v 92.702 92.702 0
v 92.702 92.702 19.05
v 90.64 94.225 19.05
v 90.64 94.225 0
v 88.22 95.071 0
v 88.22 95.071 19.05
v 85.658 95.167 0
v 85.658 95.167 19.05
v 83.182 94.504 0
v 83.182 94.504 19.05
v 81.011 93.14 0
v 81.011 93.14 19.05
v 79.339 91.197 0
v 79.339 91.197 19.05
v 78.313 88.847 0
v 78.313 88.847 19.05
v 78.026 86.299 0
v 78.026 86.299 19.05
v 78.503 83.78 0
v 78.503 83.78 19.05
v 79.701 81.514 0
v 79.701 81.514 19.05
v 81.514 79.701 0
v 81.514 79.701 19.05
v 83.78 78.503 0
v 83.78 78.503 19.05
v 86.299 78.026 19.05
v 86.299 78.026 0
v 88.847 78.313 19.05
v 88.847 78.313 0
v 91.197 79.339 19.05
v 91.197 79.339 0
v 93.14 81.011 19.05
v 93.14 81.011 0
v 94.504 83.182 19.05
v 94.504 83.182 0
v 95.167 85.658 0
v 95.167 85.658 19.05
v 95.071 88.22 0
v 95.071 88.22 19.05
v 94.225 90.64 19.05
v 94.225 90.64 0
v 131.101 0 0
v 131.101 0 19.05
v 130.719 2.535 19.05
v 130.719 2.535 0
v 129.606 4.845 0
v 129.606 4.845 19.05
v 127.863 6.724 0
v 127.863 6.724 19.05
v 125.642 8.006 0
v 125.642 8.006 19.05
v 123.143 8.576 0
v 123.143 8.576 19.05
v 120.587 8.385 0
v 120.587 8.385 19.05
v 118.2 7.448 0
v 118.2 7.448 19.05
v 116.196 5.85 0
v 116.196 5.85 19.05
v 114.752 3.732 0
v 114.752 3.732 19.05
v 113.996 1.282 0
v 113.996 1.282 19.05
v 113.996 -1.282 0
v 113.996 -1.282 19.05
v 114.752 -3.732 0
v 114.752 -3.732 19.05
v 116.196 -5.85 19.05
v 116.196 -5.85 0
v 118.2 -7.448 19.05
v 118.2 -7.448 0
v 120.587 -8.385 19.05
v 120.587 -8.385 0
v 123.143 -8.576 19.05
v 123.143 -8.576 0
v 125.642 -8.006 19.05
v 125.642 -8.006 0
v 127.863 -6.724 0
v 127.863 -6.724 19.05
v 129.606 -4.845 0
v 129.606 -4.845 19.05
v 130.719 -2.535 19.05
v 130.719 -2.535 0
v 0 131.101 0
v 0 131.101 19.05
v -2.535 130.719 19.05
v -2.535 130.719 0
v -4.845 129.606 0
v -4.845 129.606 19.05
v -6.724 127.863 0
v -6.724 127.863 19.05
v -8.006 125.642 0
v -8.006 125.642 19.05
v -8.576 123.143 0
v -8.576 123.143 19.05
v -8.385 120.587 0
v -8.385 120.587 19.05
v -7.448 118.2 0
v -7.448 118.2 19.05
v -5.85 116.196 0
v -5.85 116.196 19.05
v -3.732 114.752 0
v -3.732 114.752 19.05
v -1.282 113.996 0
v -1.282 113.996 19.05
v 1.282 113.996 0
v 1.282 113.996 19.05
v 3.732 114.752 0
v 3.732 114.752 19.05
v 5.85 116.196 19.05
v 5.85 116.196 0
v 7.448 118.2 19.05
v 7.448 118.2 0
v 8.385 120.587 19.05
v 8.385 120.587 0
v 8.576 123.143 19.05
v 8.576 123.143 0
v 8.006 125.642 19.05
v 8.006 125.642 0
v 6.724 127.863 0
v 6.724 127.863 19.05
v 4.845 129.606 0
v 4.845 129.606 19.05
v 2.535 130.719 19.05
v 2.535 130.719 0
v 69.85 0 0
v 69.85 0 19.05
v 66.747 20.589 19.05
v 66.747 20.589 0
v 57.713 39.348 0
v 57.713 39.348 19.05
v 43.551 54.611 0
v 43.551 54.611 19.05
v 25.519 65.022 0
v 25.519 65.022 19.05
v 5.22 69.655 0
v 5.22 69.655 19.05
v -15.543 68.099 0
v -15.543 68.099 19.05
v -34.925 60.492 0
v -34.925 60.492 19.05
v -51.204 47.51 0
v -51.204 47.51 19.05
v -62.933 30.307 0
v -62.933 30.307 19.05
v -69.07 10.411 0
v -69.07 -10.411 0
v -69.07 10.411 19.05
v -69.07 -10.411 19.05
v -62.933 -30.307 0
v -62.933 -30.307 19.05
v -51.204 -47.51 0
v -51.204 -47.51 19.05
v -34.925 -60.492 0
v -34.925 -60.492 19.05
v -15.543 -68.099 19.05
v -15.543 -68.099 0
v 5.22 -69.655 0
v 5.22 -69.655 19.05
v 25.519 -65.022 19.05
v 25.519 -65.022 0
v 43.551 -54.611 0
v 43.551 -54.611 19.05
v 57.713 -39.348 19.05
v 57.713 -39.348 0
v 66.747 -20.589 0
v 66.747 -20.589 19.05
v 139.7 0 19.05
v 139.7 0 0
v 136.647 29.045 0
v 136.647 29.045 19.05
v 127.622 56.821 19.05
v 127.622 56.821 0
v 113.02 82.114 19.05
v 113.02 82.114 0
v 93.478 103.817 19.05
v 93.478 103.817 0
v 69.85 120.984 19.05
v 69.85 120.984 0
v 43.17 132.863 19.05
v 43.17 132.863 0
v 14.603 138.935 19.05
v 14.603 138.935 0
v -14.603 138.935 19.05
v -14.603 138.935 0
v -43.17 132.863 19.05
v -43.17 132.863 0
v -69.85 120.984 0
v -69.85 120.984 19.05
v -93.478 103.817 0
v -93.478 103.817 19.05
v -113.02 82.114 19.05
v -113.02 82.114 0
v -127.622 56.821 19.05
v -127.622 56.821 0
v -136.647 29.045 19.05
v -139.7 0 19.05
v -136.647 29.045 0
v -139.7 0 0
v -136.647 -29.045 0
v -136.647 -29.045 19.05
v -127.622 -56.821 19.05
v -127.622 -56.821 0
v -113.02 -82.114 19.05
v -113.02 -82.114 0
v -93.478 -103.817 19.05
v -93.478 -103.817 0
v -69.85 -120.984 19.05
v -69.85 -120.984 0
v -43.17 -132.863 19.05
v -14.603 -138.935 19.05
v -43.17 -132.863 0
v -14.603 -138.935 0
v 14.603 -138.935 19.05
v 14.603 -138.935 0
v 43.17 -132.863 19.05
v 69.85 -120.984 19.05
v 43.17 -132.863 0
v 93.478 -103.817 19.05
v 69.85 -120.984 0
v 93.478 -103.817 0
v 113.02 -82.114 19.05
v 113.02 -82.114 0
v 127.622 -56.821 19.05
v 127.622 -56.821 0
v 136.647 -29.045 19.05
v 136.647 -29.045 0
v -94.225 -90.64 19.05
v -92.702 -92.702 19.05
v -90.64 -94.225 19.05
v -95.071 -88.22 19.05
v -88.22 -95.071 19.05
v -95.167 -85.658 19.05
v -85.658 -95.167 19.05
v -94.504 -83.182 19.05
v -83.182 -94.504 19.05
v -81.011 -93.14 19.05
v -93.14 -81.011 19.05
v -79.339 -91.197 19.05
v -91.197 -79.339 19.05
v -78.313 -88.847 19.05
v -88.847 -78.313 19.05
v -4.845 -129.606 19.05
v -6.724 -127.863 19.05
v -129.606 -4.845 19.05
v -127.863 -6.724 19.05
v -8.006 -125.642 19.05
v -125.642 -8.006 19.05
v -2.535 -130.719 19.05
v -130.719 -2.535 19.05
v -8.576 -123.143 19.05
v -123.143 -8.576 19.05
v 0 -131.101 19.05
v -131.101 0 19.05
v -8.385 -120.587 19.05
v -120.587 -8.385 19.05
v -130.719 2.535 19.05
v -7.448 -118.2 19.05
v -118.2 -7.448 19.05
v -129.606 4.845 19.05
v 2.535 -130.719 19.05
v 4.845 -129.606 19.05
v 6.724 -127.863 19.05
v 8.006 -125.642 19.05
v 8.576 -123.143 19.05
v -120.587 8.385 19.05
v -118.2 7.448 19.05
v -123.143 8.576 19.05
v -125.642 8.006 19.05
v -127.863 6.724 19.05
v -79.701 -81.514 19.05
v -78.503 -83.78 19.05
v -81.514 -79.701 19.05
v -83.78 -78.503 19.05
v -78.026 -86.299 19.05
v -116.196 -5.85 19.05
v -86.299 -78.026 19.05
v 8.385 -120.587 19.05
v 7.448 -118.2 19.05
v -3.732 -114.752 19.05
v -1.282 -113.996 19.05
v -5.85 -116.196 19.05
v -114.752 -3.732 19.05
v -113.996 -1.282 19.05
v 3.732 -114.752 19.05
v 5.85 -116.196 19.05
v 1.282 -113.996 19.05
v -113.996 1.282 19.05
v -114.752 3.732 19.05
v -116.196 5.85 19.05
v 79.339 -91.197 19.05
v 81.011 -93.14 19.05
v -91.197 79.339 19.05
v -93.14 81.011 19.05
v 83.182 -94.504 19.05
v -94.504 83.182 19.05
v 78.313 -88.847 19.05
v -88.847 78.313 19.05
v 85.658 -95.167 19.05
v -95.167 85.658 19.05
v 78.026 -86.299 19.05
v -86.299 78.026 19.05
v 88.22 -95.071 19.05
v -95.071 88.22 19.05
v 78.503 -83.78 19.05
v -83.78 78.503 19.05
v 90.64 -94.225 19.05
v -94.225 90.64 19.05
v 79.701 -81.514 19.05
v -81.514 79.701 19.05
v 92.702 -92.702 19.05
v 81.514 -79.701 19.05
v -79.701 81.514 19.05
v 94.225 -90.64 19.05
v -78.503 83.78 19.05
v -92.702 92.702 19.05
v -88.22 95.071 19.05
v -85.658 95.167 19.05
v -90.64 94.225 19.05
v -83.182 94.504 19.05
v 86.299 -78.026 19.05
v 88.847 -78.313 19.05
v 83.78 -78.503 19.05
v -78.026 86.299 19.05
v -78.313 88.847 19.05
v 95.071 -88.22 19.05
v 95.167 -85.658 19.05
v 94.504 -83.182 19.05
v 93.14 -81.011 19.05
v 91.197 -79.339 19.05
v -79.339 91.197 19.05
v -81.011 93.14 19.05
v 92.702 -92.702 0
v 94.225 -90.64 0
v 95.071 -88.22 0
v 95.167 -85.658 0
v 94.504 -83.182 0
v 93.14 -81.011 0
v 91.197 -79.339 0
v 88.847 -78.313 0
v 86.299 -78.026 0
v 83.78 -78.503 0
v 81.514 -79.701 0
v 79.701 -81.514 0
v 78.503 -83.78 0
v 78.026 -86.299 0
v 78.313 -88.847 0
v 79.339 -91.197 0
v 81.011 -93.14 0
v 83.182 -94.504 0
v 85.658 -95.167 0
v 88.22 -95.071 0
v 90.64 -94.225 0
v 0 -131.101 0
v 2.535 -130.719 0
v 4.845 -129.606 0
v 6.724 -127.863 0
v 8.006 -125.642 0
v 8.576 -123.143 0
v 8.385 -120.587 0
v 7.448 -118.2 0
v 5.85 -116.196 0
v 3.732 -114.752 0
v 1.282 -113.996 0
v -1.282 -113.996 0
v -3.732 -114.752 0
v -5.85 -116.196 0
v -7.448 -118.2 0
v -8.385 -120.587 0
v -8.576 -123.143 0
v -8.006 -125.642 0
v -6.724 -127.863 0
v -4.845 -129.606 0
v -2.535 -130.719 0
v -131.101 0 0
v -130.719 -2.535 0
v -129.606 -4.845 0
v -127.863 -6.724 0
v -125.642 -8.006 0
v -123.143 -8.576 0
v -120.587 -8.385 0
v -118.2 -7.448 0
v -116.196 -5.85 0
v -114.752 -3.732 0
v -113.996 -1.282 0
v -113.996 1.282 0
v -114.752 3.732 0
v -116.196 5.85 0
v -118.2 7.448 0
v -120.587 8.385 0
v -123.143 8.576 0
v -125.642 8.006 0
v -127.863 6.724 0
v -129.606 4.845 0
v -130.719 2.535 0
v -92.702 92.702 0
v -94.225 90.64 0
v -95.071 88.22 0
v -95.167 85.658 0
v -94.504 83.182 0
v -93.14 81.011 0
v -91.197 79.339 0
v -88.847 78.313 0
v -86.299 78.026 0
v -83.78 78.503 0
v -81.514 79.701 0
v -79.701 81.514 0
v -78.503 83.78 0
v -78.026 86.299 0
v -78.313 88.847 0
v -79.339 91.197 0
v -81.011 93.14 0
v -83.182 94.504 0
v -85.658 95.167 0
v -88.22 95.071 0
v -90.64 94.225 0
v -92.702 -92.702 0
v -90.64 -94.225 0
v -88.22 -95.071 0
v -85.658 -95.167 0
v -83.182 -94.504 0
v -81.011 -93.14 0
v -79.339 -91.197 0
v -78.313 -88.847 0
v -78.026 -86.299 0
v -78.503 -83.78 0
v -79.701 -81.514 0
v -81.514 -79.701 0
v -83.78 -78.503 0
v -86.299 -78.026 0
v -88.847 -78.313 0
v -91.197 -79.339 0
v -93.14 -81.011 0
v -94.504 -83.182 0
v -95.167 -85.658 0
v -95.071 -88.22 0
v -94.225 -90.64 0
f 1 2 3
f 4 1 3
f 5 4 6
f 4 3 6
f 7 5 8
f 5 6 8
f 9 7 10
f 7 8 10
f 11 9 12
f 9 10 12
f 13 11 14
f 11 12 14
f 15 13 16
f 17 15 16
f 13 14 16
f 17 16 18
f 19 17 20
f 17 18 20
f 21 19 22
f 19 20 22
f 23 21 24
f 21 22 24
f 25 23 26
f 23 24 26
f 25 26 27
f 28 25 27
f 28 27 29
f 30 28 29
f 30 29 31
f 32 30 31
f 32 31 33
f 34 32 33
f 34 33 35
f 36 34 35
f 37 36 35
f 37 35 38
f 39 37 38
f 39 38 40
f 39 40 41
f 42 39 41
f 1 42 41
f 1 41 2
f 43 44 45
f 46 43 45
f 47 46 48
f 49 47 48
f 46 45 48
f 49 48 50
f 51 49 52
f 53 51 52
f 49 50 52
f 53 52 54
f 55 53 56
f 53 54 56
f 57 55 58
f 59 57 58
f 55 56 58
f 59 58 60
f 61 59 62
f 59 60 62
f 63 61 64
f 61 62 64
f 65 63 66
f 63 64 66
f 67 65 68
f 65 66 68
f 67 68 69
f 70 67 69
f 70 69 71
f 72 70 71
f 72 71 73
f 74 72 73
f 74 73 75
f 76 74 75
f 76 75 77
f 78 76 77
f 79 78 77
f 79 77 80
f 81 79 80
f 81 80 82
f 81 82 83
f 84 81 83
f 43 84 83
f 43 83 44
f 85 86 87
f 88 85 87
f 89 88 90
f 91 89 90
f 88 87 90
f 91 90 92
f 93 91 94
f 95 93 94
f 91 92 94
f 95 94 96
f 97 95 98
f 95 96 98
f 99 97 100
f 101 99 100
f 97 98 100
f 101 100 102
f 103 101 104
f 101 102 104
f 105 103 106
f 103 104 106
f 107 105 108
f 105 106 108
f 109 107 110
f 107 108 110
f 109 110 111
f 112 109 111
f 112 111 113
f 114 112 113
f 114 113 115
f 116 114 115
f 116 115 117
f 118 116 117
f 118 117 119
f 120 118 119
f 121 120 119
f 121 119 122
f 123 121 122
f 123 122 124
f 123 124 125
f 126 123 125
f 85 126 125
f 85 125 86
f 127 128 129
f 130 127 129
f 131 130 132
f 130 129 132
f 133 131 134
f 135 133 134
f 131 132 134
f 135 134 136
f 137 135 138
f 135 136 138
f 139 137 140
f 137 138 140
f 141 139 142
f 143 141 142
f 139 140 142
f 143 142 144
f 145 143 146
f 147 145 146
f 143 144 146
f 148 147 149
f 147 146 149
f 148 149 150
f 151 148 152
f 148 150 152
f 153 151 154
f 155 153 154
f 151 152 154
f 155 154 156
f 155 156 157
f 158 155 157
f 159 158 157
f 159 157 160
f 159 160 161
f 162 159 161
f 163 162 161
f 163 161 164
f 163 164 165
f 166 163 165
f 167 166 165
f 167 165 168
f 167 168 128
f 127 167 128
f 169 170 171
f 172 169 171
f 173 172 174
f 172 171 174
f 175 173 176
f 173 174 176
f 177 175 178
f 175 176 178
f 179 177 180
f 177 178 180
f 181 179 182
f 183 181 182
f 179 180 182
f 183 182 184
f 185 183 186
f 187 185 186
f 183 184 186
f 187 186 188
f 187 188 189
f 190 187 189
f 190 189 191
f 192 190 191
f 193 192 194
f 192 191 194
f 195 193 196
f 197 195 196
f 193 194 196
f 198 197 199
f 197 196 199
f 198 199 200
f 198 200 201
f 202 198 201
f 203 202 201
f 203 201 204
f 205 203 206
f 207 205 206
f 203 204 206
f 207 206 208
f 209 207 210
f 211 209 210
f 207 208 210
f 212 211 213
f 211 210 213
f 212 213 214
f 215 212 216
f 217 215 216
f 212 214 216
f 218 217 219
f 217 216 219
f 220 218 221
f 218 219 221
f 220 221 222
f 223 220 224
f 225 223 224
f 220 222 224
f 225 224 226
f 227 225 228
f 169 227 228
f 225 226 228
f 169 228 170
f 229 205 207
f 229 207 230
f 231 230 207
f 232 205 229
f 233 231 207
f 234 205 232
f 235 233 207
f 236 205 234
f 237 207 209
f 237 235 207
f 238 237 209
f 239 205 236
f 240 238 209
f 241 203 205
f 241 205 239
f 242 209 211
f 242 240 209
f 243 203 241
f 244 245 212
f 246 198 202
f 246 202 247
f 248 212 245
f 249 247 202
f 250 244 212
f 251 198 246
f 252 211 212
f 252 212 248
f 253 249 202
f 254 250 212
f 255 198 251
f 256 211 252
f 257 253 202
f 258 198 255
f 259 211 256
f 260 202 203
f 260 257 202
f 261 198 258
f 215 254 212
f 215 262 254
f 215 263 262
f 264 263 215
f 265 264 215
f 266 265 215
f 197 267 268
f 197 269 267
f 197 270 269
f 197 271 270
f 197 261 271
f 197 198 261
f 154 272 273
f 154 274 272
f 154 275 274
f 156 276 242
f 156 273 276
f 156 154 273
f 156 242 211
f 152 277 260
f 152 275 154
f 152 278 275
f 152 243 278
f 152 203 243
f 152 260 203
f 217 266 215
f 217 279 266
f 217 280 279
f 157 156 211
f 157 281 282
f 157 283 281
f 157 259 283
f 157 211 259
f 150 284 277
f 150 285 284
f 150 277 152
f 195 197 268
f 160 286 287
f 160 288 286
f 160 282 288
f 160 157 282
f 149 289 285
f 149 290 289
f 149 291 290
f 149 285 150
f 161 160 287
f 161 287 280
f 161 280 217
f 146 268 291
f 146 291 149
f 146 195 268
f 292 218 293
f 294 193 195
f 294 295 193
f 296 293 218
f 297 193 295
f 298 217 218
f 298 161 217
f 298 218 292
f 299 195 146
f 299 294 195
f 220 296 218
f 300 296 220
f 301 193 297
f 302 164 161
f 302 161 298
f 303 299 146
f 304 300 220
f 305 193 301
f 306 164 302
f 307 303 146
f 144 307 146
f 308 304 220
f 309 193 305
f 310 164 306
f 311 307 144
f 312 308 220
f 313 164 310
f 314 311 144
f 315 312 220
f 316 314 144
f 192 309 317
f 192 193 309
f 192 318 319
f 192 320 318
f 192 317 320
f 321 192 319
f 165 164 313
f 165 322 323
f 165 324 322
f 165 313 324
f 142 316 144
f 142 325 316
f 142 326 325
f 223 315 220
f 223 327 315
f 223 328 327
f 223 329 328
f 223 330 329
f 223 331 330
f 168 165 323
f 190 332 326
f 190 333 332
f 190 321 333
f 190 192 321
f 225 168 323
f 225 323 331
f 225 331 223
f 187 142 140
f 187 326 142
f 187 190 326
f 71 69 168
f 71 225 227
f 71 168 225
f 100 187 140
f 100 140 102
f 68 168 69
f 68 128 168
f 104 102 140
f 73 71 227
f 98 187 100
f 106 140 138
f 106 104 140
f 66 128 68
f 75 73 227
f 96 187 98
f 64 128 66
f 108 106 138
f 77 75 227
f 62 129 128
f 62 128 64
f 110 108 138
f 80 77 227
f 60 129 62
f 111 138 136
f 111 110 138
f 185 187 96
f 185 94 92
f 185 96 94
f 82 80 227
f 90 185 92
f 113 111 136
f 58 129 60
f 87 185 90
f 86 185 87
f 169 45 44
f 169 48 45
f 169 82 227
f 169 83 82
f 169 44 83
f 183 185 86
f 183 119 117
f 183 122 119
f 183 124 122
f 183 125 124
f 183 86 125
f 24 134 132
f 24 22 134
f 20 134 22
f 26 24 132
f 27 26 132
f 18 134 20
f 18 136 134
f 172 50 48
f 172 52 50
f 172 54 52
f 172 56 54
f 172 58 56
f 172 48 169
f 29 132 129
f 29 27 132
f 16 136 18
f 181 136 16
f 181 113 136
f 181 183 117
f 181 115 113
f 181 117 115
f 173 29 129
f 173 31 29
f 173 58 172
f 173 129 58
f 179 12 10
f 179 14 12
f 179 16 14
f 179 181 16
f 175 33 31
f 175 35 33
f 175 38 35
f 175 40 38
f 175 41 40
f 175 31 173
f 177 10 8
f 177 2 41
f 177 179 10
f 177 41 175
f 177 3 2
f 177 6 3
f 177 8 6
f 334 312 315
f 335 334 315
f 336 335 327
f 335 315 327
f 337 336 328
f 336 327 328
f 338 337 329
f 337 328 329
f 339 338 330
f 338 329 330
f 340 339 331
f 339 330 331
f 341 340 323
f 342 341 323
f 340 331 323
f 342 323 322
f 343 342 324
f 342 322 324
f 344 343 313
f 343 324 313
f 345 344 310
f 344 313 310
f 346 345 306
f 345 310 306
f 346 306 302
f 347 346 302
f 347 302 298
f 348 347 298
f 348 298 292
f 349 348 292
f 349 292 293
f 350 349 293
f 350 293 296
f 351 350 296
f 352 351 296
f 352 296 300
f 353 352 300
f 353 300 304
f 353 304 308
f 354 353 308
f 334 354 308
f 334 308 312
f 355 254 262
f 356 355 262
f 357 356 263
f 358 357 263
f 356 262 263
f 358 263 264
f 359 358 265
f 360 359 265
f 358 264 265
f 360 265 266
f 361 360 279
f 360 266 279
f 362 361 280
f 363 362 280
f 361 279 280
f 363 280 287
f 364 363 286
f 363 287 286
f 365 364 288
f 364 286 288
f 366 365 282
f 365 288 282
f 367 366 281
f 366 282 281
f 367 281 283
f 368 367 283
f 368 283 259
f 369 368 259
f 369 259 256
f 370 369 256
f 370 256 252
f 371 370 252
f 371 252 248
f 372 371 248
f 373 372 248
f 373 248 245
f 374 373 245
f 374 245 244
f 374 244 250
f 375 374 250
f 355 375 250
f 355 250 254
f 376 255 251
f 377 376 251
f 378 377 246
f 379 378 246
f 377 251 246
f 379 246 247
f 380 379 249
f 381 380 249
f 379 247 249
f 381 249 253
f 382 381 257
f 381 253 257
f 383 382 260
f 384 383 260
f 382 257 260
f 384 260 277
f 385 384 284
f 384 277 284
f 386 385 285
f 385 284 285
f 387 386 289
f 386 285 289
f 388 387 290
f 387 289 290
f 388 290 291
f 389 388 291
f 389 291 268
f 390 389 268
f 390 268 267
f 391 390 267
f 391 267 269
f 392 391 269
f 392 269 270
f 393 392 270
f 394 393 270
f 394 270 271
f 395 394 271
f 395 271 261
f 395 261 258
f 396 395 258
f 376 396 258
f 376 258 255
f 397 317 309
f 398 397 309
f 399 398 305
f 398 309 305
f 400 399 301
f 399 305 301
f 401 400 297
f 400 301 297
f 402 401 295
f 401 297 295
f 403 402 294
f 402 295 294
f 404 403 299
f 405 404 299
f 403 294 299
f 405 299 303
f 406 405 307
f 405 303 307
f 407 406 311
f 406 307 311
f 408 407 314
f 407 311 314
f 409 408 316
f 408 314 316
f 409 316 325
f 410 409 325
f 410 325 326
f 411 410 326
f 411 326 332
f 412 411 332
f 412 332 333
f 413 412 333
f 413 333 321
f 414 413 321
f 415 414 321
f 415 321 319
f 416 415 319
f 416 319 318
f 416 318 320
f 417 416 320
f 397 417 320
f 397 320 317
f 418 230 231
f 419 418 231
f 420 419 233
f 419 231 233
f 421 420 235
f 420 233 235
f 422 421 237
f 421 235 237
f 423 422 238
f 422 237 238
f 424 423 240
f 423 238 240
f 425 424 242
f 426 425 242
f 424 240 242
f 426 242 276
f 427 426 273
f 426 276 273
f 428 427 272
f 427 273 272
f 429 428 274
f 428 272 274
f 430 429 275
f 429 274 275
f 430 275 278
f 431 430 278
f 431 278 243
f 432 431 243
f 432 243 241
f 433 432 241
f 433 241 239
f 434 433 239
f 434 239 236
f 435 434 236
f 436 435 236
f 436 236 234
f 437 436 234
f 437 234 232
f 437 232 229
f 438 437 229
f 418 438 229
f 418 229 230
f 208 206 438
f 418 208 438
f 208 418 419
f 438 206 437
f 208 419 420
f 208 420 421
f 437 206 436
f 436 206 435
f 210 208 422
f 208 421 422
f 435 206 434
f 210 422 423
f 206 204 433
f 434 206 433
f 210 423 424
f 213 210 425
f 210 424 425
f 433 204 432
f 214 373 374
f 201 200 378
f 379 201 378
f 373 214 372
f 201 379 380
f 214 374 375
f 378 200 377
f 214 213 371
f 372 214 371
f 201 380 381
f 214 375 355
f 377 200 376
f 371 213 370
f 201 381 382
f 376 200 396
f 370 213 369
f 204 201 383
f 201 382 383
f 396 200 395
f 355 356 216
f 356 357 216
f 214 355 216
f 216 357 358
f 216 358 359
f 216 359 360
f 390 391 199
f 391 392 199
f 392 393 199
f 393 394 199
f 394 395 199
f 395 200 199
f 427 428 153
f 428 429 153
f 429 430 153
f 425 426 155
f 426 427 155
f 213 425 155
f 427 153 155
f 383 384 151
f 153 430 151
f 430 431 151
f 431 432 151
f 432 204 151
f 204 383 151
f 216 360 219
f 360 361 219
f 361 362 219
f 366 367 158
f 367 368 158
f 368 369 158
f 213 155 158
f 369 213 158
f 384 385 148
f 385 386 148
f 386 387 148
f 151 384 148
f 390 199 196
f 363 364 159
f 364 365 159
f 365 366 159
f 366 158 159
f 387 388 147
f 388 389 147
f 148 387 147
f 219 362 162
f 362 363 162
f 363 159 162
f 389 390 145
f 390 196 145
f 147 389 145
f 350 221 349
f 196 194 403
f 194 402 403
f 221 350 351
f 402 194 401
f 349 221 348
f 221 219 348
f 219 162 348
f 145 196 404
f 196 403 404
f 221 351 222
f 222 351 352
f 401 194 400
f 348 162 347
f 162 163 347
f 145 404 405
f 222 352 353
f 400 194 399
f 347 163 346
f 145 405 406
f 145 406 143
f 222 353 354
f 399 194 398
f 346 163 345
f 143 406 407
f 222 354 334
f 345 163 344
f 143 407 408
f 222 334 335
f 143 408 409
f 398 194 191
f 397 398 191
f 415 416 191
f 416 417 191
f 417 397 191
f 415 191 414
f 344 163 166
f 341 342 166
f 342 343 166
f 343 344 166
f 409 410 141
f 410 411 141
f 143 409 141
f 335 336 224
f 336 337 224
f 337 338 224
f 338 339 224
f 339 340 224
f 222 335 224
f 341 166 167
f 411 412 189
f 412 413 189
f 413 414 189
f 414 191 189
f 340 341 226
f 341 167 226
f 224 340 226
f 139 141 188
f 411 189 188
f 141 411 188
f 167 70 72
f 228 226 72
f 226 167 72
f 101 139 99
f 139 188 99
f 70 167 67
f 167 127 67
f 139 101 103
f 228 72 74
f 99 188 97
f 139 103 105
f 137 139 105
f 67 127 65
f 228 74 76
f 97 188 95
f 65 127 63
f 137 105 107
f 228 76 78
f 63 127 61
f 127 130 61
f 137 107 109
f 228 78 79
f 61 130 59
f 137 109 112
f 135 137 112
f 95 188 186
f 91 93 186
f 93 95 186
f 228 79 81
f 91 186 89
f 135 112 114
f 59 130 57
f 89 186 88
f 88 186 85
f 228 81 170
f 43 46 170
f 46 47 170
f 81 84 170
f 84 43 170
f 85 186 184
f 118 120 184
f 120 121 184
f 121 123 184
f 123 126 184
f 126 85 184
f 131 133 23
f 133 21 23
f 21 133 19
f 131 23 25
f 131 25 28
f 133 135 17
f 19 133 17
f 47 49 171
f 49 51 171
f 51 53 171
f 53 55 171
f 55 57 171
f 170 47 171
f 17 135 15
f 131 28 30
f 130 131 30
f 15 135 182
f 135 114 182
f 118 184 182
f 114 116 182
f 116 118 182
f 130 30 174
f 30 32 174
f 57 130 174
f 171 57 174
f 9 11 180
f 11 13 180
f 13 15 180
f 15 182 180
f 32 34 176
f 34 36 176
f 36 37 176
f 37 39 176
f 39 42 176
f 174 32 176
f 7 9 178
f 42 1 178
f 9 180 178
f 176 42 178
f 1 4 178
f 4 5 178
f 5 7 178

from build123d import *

# Parameters (mm, degrees)
F0_R            = 139.7
F1_DEPTH        = 19.05
F2_R            = 69.85
F3_DEPTH        = 19.051
F4_R            = 8.60044
F5_DEPTH        = 19.051
F5_COPIES_COUNT = 8


# Not quite as in the source:
# - a pattern or mirror of a feature is missing from the dataset's text; its kind, count and spacing are read off the source's solid


with BuildPart() as f1:
    # F0 (on Top) → F1 (new body)
    with BuildSketch(Plane.XY):
        Circle(F0_R)
    extrude(amount=F1_DEPTH)

    # F2 (on face) → F3 (cut, through all)
    with BuildSketch(Plane.XY.offset(19.05)):
        Circle(F2_R)
    extrude(amount=-F3_DEPTH, mode=Mode.SUBTRACT)

    # F4 (on face) → F5 (cut, through all)
    with BuildSketch(Plane.XY.offset(19.05)):
        with Locations((122.50039, 0)):
            Circle(F4_R)
    f5 = extrude(amount=-F5_DEPTH, mode=Mode.SUBTRACT)

    # F5_copies: F5 ×8 about axis
    f5_copies_axis = Axis((0, 0, 0), (0, 0, 1))
    for i in range(1, F5_COPIES_COUNT):
        add(f5.rotate(f5_copies_axis, i * 360 / F5_COPIES_COUNT), mode=Mode.SUBTRACT)


solid = f1.part
